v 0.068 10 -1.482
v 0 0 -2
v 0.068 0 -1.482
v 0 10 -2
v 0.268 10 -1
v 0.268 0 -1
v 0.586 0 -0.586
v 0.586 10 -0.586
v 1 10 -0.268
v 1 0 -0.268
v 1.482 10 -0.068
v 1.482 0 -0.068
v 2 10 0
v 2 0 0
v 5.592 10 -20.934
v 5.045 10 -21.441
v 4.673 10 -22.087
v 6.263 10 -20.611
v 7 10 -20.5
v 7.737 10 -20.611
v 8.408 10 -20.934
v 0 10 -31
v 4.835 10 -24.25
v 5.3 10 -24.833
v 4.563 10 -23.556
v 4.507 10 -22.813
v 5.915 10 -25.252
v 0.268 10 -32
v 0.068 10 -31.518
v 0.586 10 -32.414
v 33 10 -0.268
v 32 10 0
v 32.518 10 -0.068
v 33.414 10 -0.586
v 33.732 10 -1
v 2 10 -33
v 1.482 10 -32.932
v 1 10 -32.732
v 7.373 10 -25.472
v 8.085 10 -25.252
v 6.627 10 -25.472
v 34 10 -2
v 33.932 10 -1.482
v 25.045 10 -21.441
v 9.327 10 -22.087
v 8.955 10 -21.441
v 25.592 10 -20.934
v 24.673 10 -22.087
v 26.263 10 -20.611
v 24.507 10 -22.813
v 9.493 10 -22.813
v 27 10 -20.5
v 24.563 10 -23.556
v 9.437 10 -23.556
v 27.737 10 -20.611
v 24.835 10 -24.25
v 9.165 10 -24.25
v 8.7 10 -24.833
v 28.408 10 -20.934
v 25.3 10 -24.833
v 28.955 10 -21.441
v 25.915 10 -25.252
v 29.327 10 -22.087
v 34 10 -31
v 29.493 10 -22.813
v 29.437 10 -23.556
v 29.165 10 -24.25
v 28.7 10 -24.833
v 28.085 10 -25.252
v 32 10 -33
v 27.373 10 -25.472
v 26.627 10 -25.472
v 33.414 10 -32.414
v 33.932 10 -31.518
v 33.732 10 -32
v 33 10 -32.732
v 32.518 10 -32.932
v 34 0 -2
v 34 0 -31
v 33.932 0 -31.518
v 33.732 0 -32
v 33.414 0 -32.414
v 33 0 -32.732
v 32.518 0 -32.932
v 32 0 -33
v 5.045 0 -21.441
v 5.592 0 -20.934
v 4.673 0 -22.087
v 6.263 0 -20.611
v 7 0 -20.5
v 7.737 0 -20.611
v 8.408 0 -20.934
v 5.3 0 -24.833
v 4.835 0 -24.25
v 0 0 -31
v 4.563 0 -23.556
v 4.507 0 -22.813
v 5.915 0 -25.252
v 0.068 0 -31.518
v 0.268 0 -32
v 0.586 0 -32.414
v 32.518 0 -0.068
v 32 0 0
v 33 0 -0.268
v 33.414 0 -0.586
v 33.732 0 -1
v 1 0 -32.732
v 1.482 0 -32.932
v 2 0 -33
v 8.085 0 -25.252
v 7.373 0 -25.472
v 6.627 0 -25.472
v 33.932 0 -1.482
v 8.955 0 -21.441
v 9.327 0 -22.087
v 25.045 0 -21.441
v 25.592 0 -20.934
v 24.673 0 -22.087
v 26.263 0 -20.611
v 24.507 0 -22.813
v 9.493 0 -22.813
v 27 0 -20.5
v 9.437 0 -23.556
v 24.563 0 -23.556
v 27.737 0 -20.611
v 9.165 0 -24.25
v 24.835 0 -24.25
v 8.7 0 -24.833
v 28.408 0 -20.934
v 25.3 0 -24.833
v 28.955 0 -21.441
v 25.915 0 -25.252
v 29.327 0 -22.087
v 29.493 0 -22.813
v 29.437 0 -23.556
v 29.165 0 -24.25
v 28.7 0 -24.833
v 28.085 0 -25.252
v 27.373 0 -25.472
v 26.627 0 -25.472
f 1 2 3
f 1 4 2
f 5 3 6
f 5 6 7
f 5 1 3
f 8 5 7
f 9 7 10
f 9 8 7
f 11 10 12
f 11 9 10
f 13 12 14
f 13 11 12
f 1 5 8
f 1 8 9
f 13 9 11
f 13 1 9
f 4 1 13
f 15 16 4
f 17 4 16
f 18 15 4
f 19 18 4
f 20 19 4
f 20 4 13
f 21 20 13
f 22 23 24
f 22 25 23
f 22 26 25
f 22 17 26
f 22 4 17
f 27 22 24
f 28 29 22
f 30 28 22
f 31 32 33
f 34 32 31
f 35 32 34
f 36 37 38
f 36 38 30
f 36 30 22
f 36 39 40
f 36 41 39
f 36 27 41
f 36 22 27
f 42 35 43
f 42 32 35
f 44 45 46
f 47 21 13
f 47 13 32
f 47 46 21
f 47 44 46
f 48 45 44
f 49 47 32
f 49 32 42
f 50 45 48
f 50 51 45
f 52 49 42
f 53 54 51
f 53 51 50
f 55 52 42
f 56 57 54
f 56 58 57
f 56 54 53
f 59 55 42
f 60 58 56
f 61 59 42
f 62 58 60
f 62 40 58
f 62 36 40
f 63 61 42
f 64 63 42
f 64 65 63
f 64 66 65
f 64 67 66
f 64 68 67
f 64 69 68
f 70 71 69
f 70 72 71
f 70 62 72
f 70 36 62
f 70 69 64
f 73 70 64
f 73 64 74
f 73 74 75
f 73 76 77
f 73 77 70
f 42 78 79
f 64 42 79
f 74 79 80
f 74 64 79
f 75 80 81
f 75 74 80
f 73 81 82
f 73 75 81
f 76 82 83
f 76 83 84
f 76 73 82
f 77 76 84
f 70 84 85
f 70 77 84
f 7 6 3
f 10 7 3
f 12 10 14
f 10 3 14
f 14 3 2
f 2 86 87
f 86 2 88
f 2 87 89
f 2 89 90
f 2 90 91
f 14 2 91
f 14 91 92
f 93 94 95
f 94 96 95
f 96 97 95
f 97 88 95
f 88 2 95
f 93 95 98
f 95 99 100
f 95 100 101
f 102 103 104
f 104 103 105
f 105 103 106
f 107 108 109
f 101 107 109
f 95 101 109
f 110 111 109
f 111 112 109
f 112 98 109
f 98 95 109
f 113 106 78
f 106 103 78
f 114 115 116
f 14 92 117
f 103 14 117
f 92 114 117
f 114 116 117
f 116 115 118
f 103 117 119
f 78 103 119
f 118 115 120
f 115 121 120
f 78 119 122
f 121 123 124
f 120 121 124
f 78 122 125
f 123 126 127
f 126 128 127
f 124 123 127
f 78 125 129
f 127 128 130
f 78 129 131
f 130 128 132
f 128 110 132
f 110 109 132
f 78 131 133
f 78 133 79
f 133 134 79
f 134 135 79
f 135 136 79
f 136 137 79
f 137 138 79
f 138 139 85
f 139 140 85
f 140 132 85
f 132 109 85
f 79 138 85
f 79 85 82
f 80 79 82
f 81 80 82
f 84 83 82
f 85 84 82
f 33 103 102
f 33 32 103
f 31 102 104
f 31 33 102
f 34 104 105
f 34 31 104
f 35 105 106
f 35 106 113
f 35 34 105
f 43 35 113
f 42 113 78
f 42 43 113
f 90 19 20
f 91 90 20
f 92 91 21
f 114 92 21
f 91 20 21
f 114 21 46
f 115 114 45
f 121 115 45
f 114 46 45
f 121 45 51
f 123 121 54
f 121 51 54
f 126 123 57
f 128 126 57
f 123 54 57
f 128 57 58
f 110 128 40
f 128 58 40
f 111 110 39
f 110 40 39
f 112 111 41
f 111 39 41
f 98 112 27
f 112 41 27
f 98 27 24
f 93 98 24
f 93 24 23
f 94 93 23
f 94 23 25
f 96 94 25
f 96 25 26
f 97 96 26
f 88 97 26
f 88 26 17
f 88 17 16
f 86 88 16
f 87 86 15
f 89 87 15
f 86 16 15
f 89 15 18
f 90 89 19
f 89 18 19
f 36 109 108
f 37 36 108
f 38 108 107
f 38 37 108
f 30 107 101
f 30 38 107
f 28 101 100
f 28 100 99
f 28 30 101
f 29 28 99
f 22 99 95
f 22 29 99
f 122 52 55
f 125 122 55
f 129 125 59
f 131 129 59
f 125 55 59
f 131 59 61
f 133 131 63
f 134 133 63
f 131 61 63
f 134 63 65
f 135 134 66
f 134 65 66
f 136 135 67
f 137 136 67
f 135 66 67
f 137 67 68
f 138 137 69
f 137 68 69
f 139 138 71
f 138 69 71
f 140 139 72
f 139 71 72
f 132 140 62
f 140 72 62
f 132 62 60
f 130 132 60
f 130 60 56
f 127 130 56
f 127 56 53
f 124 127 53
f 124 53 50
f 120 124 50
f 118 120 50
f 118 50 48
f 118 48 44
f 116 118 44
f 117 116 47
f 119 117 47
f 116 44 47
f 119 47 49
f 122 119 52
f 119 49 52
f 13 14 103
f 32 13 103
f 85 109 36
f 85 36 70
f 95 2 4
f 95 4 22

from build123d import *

# Parameters (mm, degrees)
SKETCH2_W           = 34
SKETCH2_H           = 33
BOSS_EXTRUDE1_DEPTH = 10
FILLET1_R           = 2
FILLET2_R           = 2
FILLET3_R           = 2
FILLET4_R           = 2
SKETCH3_R           = 2.5
CUT_EXTRUDE1_DEPTH  = 10


with BuildPart() as part:
    # Sketch2 → Boss-Extrude1 (new body)
    with BuildSketch(Plane(origin=(0, 0, 0), x_dir=(1, 0, 0), z_dir=(0, 1, 0))):
        with Locations((17, 16.5)):
            Rectangle(SKETCH2_W, SKETCH2_H)
    extrude(amount=BOSS_EXTRUDE1_DEPTH)

    # Fillet1
    fillet1_edges = [part.edges().sort_by_distance(p)[0] for p in [
        (34, 5, 0),
    ]]
    fillet(fillet1_edges, radius=FILLET1_R)

    # Fillet2
    fillet2_edges = [part.edges().sort_by_distance(p)[0] for p in [
        (34, 5, -33),
    ]]
    fillet(fillet2_edges, radius=FILLET2_R)

    # Fillet3
    fillet3_edges = [part.edges().sort_by_distance(p)[0] for p in [
        (0, 5, -33),
    ]]
    fillet(fillet3_edges, radius=FILLET3_R)

    # Fillet4
    fillet4_edges = [part.edges().sort_by_distance(p)[0] for p in [
        (0, 5, 0),
    ]]
    fillet(fillet4_edges, radius=FILLET4_R)

    # Sketch3 → Cut-Extrude1 (cut)
    with BuildSketch(Plane(origin=(0, 10, 0), x_dir=(1, 0, 0), z_dir=(0, 1, 0))):
        with Locations(Location((7, 23, 0), (0, 0, 270))):
            Circle(SKETCH3_R)
        with Locations(Location((27, 23, 0), (0, 0, 270))):
            Circle(SKETCH3_R)
    extrude(amount=-CUT_EXTRUDE1_DEPTH, mode=Mode.SUBTRACT)


solid = part.part
